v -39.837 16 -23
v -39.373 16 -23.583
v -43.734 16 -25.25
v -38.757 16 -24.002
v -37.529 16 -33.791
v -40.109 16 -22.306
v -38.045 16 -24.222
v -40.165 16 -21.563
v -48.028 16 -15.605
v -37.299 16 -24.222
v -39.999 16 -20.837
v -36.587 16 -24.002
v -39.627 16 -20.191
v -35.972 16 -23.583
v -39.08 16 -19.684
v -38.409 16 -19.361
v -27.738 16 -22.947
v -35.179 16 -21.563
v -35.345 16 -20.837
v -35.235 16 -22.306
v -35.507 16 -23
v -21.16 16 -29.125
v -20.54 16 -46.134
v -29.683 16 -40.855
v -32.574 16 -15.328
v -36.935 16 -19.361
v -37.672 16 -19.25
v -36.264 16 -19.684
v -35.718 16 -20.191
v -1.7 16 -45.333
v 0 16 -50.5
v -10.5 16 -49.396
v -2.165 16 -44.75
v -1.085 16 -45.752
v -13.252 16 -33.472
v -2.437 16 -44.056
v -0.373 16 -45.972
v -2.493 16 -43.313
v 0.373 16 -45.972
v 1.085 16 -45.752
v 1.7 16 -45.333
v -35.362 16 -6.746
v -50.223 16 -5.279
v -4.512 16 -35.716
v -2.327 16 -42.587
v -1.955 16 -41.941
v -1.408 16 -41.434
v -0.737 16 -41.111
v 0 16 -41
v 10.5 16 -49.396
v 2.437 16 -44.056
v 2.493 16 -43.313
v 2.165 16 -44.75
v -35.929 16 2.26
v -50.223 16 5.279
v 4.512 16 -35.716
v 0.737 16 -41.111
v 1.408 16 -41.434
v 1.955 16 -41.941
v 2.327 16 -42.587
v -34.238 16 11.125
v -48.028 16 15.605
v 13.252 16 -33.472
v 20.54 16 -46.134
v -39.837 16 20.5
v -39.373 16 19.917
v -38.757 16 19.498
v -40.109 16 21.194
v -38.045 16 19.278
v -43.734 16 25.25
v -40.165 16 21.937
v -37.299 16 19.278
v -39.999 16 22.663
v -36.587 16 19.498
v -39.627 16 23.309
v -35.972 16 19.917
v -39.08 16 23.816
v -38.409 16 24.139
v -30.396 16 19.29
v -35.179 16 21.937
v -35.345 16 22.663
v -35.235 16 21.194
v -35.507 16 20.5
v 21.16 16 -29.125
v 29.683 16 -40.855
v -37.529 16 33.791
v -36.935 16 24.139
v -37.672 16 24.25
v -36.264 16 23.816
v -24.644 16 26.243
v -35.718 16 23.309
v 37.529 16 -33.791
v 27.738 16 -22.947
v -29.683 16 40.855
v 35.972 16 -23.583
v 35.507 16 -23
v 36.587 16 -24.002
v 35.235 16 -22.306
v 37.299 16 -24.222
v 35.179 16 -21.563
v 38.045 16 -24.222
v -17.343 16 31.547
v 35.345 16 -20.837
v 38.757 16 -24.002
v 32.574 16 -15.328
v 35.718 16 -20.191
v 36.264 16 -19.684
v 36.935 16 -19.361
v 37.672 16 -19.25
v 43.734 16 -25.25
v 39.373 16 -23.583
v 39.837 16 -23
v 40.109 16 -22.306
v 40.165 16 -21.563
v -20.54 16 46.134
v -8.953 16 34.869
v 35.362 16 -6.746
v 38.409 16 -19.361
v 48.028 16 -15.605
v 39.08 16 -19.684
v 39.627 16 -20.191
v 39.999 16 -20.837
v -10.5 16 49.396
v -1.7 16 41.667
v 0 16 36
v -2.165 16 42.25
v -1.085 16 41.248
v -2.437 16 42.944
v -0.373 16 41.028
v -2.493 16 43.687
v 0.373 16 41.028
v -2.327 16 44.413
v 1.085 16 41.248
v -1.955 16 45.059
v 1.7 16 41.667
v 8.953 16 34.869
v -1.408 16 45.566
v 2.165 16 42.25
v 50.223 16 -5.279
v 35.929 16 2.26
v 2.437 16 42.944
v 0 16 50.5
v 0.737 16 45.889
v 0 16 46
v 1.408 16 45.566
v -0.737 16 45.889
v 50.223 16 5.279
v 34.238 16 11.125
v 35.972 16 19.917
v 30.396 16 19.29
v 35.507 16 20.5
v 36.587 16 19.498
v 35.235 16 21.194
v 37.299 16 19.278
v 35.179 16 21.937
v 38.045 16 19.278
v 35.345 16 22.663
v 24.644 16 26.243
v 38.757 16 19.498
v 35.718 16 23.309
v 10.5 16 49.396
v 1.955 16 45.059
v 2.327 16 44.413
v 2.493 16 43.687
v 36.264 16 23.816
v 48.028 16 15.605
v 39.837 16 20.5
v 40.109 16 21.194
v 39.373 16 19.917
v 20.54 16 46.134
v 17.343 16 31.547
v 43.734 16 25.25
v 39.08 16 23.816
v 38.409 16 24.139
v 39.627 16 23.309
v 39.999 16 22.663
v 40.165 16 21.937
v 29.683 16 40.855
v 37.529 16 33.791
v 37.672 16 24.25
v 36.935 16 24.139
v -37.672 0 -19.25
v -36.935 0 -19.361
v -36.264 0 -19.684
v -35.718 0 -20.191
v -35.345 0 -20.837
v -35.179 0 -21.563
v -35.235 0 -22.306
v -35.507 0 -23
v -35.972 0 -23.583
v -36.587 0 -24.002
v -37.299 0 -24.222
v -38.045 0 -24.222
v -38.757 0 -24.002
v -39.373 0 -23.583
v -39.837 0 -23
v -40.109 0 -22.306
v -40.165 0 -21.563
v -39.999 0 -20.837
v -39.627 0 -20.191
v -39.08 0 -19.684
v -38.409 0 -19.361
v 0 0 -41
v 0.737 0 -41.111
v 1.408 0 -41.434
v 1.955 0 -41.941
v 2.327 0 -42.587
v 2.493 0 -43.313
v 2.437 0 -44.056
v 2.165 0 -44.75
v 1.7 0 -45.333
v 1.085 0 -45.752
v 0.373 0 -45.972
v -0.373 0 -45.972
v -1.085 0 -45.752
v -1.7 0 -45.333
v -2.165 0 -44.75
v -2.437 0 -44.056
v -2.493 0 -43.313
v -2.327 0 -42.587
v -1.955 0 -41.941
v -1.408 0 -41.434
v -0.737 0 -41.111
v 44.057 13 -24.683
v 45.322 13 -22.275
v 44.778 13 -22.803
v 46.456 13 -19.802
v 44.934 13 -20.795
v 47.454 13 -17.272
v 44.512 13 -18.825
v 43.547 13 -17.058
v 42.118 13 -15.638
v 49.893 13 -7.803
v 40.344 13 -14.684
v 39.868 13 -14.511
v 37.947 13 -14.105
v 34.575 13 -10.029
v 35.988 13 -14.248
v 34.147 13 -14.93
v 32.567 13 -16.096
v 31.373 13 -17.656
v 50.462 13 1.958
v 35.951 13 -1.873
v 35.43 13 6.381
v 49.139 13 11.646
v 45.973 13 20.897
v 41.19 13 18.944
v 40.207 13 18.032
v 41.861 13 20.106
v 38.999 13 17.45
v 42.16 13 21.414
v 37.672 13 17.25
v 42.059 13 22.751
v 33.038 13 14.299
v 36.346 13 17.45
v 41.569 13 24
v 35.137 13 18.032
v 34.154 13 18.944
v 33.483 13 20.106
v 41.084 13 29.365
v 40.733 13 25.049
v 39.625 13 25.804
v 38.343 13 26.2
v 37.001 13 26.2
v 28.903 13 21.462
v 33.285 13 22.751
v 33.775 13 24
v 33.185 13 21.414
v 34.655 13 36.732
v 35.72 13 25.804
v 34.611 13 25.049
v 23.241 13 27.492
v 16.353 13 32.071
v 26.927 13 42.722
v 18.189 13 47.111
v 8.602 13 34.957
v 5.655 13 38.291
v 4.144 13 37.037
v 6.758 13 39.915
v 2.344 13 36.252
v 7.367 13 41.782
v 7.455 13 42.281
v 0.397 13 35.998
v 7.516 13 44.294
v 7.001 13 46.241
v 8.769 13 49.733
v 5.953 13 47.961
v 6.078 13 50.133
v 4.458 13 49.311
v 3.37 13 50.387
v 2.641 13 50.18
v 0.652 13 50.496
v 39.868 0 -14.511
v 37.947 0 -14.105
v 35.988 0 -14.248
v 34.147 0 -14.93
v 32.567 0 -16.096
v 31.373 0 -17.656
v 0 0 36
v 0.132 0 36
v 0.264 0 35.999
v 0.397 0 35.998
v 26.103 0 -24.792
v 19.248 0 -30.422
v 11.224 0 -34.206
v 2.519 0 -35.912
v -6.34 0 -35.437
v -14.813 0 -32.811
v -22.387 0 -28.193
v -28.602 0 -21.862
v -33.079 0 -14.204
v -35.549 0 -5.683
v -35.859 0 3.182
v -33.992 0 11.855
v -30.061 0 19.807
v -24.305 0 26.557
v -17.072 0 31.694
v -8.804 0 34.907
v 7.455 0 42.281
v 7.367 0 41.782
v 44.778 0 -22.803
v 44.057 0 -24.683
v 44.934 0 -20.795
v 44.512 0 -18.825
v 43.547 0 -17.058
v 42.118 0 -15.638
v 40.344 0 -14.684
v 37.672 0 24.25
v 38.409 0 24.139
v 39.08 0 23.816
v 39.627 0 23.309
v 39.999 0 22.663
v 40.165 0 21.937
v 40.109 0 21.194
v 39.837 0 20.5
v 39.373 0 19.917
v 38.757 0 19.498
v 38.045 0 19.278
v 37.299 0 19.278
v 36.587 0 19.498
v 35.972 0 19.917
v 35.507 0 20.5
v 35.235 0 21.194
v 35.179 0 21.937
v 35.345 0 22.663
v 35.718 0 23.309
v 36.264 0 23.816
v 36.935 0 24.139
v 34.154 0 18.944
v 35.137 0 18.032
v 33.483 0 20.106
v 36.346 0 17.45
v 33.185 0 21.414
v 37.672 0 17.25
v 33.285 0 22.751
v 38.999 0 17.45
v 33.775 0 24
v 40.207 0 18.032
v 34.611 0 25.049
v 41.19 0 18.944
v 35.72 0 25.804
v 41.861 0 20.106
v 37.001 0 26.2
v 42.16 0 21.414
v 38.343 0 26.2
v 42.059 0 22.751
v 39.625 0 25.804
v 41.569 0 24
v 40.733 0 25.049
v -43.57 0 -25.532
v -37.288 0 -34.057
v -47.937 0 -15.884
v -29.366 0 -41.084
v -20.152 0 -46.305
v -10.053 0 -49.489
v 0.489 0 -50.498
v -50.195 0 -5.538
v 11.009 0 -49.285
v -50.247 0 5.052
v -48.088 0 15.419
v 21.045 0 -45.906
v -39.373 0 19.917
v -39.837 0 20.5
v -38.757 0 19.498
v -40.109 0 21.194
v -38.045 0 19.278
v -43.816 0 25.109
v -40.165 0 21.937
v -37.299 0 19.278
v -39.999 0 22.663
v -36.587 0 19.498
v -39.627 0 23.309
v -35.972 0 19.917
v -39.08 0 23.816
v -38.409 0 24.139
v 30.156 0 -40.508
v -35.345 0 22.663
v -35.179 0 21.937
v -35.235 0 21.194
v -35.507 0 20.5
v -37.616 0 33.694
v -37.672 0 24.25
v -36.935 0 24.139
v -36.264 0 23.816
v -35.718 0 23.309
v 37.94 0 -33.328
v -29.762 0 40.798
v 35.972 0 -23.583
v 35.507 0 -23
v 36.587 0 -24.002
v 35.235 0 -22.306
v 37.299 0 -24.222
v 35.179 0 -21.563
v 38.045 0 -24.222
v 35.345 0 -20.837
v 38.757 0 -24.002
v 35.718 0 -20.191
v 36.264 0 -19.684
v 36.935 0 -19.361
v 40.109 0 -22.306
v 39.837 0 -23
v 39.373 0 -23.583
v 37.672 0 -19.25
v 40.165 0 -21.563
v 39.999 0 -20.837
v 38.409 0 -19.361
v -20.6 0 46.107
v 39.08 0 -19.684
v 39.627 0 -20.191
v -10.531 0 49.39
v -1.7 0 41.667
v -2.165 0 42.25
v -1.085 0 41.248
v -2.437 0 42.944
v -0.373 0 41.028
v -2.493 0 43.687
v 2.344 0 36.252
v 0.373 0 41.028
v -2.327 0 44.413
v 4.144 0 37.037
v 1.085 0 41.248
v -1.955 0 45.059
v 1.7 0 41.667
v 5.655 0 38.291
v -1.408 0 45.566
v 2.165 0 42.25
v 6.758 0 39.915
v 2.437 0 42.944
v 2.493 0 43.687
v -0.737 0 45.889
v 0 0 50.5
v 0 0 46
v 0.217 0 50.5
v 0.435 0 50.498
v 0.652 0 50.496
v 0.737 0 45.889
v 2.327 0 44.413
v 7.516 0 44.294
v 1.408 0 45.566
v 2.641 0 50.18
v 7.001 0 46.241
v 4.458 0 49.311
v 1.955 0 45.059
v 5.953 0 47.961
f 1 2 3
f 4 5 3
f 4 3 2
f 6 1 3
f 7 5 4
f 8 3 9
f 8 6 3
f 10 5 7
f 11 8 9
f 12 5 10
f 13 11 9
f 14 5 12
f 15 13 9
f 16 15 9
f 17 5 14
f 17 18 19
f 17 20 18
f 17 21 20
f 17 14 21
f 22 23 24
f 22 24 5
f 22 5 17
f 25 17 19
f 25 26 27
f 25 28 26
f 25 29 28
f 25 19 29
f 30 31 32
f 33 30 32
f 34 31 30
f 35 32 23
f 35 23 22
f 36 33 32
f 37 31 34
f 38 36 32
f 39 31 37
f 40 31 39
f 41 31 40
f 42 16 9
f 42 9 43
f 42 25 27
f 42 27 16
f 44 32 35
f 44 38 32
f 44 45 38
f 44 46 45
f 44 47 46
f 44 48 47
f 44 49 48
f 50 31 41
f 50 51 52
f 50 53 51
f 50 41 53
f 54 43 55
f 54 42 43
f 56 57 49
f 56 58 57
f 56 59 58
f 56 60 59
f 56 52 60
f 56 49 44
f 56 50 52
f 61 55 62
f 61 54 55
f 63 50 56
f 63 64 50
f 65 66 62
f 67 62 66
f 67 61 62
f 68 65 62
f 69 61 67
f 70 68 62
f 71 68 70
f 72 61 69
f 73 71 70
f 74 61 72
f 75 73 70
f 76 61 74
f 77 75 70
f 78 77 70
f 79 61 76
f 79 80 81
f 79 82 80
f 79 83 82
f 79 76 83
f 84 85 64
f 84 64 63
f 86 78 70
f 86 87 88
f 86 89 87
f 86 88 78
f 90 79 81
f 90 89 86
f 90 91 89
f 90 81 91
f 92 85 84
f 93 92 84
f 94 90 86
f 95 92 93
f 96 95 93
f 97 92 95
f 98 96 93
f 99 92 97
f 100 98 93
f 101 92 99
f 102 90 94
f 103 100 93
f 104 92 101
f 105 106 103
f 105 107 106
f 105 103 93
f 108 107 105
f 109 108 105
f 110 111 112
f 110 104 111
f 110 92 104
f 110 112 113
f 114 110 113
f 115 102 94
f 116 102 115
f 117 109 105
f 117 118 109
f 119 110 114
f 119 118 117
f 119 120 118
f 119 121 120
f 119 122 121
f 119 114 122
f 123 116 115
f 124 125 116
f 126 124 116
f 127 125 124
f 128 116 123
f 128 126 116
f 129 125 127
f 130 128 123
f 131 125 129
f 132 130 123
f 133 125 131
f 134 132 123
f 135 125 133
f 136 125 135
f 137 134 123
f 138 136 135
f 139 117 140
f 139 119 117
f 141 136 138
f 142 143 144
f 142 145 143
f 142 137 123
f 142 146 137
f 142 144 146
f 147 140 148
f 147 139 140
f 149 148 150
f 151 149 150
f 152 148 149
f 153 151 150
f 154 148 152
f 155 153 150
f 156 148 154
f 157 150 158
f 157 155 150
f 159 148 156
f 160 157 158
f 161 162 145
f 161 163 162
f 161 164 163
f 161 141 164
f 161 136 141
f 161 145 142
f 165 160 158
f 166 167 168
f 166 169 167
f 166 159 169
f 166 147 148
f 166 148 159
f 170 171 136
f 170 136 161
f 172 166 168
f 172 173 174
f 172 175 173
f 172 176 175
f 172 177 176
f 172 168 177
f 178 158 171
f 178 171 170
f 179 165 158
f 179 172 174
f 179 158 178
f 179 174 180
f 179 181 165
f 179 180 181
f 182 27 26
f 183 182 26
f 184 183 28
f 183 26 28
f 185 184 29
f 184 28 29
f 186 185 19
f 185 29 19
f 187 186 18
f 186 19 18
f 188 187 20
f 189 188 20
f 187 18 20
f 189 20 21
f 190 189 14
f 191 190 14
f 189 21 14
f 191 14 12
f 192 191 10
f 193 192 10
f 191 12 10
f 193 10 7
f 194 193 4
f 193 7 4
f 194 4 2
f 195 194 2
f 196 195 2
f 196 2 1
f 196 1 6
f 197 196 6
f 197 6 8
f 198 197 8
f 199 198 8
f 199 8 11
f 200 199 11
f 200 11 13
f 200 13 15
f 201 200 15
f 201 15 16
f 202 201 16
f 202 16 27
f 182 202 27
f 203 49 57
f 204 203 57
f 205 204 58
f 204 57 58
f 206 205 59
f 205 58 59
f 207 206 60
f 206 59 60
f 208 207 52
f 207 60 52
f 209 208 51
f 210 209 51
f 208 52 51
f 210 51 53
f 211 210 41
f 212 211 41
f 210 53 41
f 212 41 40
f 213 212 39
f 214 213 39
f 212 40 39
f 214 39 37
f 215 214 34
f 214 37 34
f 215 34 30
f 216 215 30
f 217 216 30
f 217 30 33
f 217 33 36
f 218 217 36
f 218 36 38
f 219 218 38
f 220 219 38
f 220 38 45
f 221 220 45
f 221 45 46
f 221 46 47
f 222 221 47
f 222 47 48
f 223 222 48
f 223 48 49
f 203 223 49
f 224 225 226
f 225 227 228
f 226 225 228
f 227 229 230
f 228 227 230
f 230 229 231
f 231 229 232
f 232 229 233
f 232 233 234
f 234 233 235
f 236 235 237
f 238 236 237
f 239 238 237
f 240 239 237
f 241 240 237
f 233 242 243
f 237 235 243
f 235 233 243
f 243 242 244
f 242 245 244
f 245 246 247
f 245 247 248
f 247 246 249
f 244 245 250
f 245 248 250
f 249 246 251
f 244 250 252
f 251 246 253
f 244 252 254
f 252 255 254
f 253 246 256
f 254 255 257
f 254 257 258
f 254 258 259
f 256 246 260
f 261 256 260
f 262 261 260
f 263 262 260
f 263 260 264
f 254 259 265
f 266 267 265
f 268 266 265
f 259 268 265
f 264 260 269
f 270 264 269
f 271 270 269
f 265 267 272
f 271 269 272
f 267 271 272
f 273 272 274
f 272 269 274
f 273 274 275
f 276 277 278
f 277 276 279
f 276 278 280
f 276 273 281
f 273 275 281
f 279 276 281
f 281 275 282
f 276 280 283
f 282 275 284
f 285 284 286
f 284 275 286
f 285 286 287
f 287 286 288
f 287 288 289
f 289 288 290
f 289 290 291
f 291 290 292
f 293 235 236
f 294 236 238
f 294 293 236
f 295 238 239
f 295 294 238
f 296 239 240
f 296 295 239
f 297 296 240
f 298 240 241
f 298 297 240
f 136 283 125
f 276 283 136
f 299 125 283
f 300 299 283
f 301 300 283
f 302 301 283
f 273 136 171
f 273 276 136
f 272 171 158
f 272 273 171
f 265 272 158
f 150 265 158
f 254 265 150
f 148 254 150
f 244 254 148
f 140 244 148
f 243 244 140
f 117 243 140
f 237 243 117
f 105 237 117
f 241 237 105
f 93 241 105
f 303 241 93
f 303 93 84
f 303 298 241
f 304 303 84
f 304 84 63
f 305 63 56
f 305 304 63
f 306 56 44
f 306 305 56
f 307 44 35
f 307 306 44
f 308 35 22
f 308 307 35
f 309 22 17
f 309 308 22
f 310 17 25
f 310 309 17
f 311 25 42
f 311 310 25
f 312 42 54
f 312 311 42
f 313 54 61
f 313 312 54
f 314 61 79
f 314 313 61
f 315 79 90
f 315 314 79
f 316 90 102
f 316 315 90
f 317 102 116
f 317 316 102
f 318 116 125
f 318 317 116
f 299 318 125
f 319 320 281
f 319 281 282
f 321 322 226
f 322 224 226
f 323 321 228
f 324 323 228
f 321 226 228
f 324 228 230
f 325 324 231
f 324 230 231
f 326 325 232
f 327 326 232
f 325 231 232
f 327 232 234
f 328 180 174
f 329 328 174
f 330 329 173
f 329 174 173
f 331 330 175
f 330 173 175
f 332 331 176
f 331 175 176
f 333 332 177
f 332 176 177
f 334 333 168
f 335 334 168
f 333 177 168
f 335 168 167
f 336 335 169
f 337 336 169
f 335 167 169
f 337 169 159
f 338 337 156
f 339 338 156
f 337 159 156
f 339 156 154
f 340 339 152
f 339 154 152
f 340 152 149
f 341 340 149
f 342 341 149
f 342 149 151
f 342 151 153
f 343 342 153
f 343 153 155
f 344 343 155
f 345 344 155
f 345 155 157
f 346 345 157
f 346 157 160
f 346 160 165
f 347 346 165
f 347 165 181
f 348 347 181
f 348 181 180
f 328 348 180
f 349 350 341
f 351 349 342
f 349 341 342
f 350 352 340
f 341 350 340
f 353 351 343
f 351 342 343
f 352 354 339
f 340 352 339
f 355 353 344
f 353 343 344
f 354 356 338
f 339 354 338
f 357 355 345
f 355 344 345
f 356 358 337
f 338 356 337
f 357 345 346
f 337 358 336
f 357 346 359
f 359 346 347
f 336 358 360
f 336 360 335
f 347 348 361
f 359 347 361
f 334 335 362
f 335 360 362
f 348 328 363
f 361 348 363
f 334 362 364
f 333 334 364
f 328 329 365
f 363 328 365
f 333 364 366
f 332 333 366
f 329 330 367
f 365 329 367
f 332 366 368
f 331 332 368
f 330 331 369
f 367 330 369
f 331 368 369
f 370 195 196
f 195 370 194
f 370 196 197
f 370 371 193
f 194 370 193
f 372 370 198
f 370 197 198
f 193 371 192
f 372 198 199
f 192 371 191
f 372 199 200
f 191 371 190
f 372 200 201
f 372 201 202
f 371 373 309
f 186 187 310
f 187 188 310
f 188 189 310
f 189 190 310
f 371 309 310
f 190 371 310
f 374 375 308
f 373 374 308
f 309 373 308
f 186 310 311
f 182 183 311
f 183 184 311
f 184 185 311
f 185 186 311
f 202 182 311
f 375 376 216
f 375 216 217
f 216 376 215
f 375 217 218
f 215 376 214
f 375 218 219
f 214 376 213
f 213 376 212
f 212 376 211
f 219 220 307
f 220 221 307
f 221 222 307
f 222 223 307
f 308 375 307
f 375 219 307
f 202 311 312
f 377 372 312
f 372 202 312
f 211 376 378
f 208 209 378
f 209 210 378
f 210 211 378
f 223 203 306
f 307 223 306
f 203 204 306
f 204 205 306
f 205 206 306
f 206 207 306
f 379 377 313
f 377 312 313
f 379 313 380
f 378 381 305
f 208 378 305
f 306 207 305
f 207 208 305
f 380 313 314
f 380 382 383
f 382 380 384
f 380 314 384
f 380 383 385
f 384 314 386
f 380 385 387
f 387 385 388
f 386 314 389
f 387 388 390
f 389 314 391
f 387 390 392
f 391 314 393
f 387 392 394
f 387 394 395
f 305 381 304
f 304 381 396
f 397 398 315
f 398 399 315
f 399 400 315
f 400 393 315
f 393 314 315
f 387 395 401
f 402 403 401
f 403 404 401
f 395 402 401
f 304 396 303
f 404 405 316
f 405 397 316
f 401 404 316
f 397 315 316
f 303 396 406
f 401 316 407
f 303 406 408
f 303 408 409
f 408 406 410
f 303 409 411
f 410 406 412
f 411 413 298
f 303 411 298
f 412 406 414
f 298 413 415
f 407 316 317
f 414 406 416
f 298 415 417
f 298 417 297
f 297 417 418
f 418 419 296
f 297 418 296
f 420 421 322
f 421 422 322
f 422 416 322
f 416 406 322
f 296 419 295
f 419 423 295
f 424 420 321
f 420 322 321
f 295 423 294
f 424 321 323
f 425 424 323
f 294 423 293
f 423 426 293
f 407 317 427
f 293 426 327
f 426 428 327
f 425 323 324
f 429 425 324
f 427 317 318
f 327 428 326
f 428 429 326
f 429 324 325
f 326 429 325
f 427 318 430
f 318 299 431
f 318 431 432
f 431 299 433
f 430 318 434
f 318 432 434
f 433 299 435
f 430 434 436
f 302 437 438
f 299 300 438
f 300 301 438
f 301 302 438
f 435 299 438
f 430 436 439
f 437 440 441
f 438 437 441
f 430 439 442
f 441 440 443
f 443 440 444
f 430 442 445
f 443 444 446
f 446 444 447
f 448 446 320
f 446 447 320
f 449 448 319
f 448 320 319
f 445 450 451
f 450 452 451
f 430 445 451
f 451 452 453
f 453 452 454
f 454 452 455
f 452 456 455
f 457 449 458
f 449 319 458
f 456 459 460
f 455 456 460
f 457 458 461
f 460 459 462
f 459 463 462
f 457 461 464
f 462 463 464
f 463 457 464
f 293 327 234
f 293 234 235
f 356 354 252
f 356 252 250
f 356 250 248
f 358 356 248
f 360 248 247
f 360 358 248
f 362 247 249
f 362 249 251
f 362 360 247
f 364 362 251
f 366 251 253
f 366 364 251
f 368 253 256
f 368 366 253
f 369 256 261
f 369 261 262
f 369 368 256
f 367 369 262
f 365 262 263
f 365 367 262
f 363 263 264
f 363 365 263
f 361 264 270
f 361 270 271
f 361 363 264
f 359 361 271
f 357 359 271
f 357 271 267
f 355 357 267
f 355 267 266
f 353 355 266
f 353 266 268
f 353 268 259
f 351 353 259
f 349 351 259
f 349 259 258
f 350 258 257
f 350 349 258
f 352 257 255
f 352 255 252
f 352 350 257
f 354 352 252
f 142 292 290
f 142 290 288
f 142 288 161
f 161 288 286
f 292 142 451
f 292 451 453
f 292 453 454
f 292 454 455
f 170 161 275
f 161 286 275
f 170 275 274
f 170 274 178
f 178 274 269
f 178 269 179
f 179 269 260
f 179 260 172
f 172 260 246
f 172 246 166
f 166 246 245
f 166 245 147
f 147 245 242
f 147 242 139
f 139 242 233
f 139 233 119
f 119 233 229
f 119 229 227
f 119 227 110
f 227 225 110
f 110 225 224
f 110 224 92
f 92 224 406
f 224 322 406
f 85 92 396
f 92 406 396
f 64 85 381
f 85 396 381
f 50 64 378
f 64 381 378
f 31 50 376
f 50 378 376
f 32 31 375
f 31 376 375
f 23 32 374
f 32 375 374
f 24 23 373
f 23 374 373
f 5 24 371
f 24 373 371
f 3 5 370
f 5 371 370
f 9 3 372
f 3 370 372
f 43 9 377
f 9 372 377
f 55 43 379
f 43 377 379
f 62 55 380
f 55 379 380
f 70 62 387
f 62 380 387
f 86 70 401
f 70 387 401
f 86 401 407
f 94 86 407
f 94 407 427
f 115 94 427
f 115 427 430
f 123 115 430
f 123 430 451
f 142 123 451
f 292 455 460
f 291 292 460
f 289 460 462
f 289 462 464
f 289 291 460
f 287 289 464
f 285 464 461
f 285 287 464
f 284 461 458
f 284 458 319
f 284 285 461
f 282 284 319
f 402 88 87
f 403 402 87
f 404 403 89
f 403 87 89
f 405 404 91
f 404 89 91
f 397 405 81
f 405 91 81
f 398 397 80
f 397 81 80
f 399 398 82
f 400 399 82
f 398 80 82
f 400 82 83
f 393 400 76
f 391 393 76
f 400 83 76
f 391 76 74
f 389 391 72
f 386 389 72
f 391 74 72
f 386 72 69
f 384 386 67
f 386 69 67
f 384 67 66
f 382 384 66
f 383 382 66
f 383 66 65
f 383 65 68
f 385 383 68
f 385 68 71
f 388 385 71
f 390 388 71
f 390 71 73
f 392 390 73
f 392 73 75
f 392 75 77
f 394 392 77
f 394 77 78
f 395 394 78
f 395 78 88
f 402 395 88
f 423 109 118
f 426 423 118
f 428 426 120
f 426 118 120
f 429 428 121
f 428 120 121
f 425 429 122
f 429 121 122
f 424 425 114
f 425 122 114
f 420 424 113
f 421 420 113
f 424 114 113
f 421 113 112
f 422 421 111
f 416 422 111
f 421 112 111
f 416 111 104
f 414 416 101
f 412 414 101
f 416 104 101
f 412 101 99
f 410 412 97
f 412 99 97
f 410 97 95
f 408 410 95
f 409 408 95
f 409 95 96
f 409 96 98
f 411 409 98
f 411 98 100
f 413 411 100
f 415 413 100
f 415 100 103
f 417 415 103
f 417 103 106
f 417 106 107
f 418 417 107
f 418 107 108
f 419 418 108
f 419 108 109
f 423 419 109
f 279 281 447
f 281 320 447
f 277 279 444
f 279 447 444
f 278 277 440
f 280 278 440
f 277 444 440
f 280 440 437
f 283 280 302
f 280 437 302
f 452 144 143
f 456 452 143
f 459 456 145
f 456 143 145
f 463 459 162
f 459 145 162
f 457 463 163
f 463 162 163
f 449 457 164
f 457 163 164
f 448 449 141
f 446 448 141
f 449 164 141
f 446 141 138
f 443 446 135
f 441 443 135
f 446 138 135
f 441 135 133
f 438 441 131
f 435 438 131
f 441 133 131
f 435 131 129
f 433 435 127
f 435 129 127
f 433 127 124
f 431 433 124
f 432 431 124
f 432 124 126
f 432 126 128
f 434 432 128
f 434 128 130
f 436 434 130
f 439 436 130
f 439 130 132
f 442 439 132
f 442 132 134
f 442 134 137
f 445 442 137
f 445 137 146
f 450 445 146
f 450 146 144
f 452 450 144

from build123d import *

# Parameters (mm, degrees)
SKETCH1_R           = 50.5
SKETCH1_R_2         = 36
BOSS_EXTRUDE1_DEPTH = 16
SKETCH2_R           = 2.5
CUT_EXTRUDE1_DEPTH  = 74.188113789
SKETCH3_R           = 4.5
CUT_EXTRUDE2_DEPTH  = 13
FILLET1_R           = 7


with BuildPart() as part:
    # Sketch1 → Boss-Extrude1 (new body)
    with BuildSketch(Plane(origin=(0, 0, 0), x_dir=(1, 0, 0), z_dir=(0, 1, 0))):
        with Locations(Location((0, 0, 0), (0, 0, 270))):
            Circle(SKETCH1_R)
        with Locations(Location((0, 0, 0), (0, 0, 270))):
            Circle(SKETCH1_R_2, mode=Mode.SUBTRACT)
    extrude(amount=BOSS_EXTRUDE1_DEPTH)

    # Sketch2 → Cut-Extrude1 (cut, through all)
    with BuildSketch(Plane(origin=(0, 16, 0), x_dir=(1, 0, 0), z_dir=(0, 1, 0))):
        with Locations(Location((0, 43.5, 0), (0, 0, 270))):
            Circle(SKETCH2_R)
        with Locations(Location((37.672105065, 21.75, 0), (0, 0, 270))):
            Circle(SKETCH2_R)
        with Locations(Location((37.672105065, -21.75, 0), (0, 0, 270))):
            Circle(SKETCH2_R)
        with Locations(Location((0, -43.5, 0), (0, 0, 270))):
            Circle(SKETCH2_R)
        with Locations(Location((-37.672105065, -21.75, 0), (0, 0, 270))):
            Circle(SKETCH2_R)
        with Locations(Location((-37.672105065, 21.75, 0), (0, 0, 270))):
            Circle(SKETCH2_R)
    extrude(amount=-CUT_EXTRUDE1_DEPTH, mode=Mode.SUBTRACT)

    # Sketch3 → Cut-Extrude2 (cut)
    with BuildSketch(Plane.XZ):
        with BuildLine():
            Line((0, 0), (8.769232972, 49.732791527))
            ThreePointArc((8.769232972, 49.732791527), (43.734282891, 25.25), (47.45447735, -17.272017238))
            Line((47.45447735, -17.272017238), (0, 0))
        make_face()
        with Locations(Location((37.672105065, 21.75, 0), (0, 0, 270))):
            Circle(SKETCH3_R, mode=Mode.SUBTRACT)
    extrude(amount=-CUT_EXTRUDE2_DEPTH, mode=Mode.SUBTRACT)

    # Fillet1
    fillet1_edges = [part.edges().sort_by_distance(p)[0] for p in [
        (6.251334396, 6.5, 35.453079108),
        (33.828934348, 6.5, -12.31272516),
        (47.45447735, 6.5, -17.272017238),
        (8.769232972, 6.5, 49.732791527),
    ]]
    fillet(fillet1_edges, radius=FILLET1_R)


solid = part.part
